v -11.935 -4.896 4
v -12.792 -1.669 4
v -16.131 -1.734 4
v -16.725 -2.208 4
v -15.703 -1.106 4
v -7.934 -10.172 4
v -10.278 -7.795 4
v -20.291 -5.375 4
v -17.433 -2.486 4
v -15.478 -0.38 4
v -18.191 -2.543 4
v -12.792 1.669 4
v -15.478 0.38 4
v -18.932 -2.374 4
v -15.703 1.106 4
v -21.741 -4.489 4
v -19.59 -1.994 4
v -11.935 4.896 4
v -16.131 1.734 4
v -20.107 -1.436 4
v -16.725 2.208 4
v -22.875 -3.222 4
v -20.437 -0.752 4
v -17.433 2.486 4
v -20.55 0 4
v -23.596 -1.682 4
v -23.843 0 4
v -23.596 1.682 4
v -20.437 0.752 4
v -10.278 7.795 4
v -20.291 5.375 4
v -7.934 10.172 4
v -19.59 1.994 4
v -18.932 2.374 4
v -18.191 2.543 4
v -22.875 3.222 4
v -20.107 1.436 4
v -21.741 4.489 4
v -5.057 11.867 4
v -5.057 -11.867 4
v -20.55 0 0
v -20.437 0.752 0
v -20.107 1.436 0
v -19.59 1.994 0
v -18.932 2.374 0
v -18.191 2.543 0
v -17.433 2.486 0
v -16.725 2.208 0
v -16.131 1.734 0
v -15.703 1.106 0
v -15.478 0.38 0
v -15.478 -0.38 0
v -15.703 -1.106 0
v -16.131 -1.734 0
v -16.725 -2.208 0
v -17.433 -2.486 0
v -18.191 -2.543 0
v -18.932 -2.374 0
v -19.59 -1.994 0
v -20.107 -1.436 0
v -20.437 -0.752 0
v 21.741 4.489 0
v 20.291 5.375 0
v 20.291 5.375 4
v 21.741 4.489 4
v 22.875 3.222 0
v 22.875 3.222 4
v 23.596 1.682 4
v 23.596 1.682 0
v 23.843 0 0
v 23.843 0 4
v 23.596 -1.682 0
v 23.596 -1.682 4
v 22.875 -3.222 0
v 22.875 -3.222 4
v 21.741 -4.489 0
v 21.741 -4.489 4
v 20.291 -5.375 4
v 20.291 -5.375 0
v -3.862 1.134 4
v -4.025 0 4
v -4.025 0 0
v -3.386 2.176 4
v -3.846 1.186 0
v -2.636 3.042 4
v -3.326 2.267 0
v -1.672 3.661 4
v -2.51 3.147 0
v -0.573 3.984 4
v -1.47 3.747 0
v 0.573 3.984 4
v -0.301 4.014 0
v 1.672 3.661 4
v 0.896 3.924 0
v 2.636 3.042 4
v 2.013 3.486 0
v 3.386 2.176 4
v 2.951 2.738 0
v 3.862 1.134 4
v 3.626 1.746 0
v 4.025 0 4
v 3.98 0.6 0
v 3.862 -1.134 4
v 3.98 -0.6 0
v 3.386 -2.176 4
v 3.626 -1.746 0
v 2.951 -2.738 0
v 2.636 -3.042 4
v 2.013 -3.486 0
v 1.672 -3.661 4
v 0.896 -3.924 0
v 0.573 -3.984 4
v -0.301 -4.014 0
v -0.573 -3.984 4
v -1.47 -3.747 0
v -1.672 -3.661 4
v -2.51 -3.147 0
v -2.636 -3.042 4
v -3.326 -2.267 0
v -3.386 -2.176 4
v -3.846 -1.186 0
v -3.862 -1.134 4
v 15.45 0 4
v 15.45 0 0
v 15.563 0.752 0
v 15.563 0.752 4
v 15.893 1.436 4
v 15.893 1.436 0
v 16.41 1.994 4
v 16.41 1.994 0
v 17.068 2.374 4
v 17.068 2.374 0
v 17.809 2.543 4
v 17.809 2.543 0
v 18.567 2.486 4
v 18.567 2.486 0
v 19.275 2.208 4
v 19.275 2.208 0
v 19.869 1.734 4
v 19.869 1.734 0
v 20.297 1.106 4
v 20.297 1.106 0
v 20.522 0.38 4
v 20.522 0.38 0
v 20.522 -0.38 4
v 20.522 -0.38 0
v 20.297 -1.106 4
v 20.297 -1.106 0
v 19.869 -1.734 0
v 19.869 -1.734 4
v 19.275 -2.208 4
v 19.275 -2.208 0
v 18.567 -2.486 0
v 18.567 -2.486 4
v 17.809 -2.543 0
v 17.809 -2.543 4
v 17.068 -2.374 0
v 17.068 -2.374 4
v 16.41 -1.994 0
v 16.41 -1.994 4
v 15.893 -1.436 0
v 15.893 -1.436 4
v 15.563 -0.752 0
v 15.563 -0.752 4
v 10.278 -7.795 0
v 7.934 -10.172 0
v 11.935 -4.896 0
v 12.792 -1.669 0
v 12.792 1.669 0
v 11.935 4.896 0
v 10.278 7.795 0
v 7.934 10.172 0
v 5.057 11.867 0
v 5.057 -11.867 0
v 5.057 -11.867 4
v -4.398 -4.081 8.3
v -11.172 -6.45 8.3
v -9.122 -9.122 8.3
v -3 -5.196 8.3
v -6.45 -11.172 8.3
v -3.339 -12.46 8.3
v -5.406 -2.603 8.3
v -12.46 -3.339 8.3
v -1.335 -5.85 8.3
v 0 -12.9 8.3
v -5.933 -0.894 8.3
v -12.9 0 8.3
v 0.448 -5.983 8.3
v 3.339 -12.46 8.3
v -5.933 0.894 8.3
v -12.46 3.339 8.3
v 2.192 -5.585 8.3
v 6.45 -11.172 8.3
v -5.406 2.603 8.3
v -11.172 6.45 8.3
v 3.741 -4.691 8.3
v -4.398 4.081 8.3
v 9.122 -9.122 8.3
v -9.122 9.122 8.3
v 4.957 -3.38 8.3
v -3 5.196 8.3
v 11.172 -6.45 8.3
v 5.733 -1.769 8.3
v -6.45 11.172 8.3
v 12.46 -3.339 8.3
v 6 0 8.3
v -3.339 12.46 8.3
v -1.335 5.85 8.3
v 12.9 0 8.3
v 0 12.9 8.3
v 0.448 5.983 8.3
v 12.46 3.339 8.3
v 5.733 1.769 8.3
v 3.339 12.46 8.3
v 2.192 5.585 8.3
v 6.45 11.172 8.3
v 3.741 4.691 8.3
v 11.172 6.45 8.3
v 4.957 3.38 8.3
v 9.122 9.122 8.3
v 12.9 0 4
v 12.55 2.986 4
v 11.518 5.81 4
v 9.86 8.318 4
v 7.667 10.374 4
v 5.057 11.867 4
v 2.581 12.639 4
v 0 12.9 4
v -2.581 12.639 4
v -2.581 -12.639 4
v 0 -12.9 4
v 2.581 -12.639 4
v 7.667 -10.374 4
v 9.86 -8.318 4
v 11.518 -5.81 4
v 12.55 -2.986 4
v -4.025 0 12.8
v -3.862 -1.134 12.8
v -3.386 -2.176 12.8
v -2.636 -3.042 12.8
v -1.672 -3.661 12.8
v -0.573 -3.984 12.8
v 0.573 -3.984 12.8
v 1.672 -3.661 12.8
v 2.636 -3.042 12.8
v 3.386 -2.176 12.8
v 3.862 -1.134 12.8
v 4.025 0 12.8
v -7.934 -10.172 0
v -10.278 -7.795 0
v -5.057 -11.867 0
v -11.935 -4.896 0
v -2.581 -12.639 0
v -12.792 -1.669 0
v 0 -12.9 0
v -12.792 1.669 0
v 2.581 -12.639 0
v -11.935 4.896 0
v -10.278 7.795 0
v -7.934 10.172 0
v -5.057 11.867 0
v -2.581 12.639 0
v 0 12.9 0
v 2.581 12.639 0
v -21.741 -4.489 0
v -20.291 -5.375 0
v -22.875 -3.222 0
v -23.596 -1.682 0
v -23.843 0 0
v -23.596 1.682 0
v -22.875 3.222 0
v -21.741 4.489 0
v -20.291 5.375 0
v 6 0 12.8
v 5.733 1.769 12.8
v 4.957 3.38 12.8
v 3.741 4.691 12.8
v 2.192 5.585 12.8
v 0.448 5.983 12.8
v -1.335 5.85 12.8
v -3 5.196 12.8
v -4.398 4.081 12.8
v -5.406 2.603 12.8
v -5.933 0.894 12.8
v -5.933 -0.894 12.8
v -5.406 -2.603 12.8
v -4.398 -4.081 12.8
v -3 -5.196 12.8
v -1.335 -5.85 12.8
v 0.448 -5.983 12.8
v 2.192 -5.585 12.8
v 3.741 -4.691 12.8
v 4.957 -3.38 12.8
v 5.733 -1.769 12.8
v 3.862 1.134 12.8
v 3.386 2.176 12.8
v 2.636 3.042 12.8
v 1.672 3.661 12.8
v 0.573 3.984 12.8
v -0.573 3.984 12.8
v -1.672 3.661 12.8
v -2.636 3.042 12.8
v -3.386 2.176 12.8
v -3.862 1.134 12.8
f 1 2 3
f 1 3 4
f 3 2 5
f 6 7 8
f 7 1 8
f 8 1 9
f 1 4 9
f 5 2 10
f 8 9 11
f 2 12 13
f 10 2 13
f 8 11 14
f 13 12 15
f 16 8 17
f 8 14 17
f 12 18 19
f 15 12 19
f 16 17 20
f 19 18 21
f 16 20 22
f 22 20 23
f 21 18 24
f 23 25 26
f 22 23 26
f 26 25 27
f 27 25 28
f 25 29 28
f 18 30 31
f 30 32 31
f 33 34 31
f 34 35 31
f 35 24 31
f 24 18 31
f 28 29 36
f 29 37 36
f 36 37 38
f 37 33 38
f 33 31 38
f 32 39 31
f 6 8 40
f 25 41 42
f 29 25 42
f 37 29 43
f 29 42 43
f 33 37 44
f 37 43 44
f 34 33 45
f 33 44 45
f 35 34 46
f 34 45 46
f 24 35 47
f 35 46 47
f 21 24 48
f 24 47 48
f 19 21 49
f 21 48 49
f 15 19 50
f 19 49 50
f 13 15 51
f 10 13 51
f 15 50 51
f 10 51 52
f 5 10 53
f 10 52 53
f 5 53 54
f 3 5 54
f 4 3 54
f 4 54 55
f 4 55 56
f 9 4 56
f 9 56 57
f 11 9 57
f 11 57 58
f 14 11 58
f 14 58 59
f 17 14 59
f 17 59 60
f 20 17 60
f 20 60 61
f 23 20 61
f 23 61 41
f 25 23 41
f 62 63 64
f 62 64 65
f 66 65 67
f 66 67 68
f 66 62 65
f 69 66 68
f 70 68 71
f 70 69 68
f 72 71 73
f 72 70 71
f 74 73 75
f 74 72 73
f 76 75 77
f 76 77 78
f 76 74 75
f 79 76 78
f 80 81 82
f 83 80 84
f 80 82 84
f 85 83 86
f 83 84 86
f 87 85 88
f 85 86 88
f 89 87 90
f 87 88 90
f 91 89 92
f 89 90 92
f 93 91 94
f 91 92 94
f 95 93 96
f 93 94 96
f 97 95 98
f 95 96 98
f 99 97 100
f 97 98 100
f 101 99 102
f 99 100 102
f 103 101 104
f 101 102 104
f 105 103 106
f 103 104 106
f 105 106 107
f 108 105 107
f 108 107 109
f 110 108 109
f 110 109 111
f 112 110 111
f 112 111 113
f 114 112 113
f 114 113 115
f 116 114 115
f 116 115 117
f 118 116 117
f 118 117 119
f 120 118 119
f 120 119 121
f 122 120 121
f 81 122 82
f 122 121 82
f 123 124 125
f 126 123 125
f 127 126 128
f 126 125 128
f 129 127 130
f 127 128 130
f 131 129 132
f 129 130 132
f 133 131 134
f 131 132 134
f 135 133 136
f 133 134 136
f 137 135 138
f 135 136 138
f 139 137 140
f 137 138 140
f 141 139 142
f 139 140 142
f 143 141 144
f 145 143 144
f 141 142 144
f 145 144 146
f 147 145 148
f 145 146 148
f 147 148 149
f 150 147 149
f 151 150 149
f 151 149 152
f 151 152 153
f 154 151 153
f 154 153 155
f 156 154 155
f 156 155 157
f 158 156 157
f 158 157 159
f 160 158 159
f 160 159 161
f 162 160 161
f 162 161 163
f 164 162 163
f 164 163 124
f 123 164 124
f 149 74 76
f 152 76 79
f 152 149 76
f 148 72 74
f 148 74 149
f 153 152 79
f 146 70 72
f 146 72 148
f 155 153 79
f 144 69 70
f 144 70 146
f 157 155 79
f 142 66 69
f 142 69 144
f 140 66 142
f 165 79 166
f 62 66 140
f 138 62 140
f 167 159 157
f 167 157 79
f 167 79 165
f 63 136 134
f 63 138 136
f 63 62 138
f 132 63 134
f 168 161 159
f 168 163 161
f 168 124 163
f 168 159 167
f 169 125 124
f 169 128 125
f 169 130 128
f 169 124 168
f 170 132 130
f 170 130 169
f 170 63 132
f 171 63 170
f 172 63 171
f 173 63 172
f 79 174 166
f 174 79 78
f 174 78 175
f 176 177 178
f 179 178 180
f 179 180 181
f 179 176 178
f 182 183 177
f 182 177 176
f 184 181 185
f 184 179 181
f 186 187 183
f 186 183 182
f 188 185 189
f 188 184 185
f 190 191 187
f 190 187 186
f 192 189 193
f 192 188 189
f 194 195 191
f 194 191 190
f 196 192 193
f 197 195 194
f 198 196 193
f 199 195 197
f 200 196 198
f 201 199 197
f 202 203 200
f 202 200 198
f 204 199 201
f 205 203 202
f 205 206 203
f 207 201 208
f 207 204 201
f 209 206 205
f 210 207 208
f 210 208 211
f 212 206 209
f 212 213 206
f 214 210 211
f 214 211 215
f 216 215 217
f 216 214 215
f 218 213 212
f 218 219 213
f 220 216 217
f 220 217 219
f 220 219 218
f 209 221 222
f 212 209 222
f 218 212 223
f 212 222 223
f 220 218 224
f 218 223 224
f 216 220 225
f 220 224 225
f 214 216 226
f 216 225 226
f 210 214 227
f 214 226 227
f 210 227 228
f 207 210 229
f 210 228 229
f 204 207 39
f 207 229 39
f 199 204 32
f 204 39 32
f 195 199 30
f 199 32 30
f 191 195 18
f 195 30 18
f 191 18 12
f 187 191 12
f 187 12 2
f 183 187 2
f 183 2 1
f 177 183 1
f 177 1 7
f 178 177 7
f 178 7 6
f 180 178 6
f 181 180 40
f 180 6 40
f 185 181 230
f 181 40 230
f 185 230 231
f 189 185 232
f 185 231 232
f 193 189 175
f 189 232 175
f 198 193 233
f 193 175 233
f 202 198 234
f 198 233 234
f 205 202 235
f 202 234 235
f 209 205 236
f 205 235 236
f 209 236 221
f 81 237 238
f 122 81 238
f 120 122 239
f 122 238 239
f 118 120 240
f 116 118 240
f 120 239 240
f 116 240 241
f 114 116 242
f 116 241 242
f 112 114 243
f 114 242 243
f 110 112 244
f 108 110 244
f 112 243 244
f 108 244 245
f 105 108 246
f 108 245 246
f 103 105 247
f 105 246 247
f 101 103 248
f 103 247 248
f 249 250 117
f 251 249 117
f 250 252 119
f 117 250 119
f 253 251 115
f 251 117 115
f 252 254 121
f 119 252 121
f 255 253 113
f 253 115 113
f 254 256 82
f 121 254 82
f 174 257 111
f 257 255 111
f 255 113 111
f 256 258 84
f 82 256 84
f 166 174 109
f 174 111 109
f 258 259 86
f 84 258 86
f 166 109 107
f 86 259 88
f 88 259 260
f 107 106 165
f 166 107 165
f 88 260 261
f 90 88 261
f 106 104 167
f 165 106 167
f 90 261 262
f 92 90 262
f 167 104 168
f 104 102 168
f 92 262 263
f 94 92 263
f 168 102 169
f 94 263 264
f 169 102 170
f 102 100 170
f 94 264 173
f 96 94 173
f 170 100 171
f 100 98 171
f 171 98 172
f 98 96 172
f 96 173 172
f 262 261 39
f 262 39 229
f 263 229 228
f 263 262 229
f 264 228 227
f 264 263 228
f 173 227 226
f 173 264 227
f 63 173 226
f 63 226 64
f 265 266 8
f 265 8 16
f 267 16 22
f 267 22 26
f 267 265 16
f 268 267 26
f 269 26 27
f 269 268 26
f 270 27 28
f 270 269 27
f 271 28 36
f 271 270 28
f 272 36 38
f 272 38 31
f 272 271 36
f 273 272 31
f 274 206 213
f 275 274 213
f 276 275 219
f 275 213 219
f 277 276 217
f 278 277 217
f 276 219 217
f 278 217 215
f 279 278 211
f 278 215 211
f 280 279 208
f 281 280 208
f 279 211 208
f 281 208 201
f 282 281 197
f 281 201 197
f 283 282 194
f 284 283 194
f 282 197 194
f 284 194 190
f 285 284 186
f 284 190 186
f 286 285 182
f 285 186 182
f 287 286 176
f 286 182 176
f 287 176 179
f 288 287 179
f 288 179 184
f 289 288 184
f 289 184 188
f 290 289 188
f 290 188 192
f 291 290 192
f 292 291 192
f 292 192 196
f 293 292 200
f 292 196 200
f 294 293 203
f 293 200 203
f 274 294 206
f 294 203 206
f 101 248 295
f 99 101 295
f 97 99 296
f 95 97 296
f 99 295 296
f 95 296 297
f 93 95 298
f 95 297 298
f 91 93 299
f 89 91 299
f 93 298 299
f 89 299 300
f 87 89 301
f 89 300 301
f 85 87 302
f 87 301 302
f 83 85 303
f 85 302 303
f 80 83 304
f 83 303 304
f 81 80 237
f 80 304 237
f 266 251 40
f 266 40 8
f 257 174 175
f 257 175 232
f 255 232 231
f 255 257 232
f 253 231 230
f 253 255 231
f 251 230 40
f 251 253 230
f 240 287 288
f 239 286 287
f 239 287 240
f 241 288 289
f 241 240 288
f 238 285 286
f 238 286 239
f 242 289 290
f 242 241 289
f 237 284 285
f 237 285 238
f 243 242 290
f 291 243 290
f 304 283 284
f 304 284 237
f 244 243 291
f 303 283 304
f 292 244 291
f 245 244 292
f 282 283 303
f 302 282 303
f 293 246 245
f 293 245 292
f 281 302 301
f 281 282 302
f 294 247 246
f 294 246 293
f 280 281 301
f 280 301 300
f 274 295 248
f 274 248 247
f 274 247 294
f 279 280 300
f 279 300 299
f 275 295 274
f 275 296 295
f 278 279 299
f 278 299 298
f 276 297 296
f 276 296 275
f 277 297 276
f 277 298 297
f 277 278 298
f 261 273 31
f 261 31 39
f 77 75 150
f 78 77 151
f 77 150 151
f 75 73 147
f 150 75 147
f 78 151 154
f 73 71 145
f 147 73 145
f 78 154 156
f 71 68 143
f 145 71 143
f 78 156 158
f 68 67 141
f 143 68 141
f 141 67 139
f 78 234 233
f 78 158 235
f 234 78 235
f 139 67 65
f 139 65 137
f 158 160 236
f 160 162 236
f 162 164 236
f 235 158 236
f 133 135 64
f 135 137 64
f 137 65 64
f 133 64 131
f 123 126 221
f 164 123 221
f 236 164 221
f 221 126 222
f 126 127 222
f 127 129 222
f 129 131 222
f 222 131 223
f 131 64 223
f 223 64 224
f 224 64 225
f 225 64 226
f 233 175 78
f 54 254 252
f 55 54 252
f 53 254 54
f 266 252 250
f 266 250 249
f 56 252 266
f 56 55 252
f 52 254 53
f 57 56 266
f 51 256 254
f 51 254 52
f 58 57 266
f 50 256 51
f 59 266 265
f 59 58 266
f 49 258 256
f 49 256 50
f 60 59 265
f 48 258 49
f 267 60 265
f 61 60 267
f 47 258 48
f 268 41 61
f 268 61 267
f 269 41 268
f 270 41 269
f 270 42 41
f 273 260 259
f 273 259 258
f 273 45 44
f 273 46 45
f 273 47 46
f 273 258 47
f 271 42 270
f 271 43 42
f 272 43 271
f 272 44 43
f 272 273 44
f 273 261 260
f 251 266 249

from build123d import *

# Parameters (mm, degrees)
SKETCH_1_R          = 12.9
EXTRUDE_1_DEPTH     = 8.3
SKETCH_2_R          = 6
EXTRUDE_2_DEPTH     = 4.5
SKETCH_3_R          = 4.025
CUT_EXTRUDE_1_DEPTH = 25
EXTRUDE_3_DEPTH     = 4
SKETCH_6_R          = 2.55
CUT_EXTRUDE_3_DEPTH = 13.8
SKETCH_7_R          = 4.025
CUT_EXTRUDE_4_DEPTH = 13.8


with BuildPart() as part:
    # 草图1 → 凸台-拉伸1 (new body)
    with BuildSketch(Plane.XY):
        Circle(SKETCH_1_R)
    extrude(amount=EXTRUDE_1_DEPTH)

    # 草图2 → 凸台-拉伸2 (add)
    with BuildSketch(Plane.XY.offset(8.3)):
        Circle(SKETCH_2_R)
    extrude(amount=EXTRUDE_2_DEPTH)

    # 草图3 → 切除-拉伸1 (cut)
    with BuildSketch(Plane.XY.offset(12.8)):
        Circle(SKETCH_3_R)
    extrude(amount=-CUT_EXTRUDE_1_DEPTH, mode=Mode.SUBTRACT)

    # 草图4 → 凸台-拉伸3 (add)
    with BuildSketch(Plane(origin=(0, 0, 0), x_dir=(-1, 0, 0), z_dir=(0, 0, -1))):
        with BuildLine():
            Line((-5.057343549, 11.867319673), (-20.2907969, 5.375474071))
            ThreePointArc((-20.2907969, 5.375474071), (-23.843241559, 0), (-20.2907969, -5.375474071))
            Line((-20.2907969, -5.375474071), (-5.057343549, -11.867319673))
            ThreePointArc((-5.057343549, -11.867319673), (0, -12.9), (5.057343549, -11.867319673))
            Line((5.057343549, -11.867319673), (20.2907969, -5.375474071))
            ThreePointArc((20.2907969, -5.375474071), (23.843241559, 0), (20.2907969, 5.375474071))
            Line((20.2907969, 5.375474071), (5.057343549, 11.867319673))
            ThreePointArc((5.057343549, 11.867319673), (0, 12.9), (-5.057343549, 11.867319673))
        make_face()
    extrude(amount=-EXTRUDE_3_DEPTH)

    # 草图6 → 切除-拉伸3 (cut, through all)
    with BuildSketch(Plane(origin=(0, 0, 0), x_dir=(-1, 0, 0), z_dir=(0, 0, -1))):
        with Locations((-18, 0)):
            Circle(SKETCH_6_R)
        with Locations((18, 0)):
            Circle(SKETCH_6_R)
    extrude(amount=-CUT_EXTRUDE_3_DEPTH, mode=Mode.SUBTRACT)

    # 草图7 → 切除-拉伸4 (cut, through all)
    with BuildSketch(Plane(origin=(0, 0, 0), x_dir=(-1, 0, 0), z_dir=(0, 0, -1))):
        Circle(SKETCH_7_R)
    extrude(amount=-CUT_EXTRUDE_4_DEPTH, mode=Mode.SUBTRACT)


solid = part.part
